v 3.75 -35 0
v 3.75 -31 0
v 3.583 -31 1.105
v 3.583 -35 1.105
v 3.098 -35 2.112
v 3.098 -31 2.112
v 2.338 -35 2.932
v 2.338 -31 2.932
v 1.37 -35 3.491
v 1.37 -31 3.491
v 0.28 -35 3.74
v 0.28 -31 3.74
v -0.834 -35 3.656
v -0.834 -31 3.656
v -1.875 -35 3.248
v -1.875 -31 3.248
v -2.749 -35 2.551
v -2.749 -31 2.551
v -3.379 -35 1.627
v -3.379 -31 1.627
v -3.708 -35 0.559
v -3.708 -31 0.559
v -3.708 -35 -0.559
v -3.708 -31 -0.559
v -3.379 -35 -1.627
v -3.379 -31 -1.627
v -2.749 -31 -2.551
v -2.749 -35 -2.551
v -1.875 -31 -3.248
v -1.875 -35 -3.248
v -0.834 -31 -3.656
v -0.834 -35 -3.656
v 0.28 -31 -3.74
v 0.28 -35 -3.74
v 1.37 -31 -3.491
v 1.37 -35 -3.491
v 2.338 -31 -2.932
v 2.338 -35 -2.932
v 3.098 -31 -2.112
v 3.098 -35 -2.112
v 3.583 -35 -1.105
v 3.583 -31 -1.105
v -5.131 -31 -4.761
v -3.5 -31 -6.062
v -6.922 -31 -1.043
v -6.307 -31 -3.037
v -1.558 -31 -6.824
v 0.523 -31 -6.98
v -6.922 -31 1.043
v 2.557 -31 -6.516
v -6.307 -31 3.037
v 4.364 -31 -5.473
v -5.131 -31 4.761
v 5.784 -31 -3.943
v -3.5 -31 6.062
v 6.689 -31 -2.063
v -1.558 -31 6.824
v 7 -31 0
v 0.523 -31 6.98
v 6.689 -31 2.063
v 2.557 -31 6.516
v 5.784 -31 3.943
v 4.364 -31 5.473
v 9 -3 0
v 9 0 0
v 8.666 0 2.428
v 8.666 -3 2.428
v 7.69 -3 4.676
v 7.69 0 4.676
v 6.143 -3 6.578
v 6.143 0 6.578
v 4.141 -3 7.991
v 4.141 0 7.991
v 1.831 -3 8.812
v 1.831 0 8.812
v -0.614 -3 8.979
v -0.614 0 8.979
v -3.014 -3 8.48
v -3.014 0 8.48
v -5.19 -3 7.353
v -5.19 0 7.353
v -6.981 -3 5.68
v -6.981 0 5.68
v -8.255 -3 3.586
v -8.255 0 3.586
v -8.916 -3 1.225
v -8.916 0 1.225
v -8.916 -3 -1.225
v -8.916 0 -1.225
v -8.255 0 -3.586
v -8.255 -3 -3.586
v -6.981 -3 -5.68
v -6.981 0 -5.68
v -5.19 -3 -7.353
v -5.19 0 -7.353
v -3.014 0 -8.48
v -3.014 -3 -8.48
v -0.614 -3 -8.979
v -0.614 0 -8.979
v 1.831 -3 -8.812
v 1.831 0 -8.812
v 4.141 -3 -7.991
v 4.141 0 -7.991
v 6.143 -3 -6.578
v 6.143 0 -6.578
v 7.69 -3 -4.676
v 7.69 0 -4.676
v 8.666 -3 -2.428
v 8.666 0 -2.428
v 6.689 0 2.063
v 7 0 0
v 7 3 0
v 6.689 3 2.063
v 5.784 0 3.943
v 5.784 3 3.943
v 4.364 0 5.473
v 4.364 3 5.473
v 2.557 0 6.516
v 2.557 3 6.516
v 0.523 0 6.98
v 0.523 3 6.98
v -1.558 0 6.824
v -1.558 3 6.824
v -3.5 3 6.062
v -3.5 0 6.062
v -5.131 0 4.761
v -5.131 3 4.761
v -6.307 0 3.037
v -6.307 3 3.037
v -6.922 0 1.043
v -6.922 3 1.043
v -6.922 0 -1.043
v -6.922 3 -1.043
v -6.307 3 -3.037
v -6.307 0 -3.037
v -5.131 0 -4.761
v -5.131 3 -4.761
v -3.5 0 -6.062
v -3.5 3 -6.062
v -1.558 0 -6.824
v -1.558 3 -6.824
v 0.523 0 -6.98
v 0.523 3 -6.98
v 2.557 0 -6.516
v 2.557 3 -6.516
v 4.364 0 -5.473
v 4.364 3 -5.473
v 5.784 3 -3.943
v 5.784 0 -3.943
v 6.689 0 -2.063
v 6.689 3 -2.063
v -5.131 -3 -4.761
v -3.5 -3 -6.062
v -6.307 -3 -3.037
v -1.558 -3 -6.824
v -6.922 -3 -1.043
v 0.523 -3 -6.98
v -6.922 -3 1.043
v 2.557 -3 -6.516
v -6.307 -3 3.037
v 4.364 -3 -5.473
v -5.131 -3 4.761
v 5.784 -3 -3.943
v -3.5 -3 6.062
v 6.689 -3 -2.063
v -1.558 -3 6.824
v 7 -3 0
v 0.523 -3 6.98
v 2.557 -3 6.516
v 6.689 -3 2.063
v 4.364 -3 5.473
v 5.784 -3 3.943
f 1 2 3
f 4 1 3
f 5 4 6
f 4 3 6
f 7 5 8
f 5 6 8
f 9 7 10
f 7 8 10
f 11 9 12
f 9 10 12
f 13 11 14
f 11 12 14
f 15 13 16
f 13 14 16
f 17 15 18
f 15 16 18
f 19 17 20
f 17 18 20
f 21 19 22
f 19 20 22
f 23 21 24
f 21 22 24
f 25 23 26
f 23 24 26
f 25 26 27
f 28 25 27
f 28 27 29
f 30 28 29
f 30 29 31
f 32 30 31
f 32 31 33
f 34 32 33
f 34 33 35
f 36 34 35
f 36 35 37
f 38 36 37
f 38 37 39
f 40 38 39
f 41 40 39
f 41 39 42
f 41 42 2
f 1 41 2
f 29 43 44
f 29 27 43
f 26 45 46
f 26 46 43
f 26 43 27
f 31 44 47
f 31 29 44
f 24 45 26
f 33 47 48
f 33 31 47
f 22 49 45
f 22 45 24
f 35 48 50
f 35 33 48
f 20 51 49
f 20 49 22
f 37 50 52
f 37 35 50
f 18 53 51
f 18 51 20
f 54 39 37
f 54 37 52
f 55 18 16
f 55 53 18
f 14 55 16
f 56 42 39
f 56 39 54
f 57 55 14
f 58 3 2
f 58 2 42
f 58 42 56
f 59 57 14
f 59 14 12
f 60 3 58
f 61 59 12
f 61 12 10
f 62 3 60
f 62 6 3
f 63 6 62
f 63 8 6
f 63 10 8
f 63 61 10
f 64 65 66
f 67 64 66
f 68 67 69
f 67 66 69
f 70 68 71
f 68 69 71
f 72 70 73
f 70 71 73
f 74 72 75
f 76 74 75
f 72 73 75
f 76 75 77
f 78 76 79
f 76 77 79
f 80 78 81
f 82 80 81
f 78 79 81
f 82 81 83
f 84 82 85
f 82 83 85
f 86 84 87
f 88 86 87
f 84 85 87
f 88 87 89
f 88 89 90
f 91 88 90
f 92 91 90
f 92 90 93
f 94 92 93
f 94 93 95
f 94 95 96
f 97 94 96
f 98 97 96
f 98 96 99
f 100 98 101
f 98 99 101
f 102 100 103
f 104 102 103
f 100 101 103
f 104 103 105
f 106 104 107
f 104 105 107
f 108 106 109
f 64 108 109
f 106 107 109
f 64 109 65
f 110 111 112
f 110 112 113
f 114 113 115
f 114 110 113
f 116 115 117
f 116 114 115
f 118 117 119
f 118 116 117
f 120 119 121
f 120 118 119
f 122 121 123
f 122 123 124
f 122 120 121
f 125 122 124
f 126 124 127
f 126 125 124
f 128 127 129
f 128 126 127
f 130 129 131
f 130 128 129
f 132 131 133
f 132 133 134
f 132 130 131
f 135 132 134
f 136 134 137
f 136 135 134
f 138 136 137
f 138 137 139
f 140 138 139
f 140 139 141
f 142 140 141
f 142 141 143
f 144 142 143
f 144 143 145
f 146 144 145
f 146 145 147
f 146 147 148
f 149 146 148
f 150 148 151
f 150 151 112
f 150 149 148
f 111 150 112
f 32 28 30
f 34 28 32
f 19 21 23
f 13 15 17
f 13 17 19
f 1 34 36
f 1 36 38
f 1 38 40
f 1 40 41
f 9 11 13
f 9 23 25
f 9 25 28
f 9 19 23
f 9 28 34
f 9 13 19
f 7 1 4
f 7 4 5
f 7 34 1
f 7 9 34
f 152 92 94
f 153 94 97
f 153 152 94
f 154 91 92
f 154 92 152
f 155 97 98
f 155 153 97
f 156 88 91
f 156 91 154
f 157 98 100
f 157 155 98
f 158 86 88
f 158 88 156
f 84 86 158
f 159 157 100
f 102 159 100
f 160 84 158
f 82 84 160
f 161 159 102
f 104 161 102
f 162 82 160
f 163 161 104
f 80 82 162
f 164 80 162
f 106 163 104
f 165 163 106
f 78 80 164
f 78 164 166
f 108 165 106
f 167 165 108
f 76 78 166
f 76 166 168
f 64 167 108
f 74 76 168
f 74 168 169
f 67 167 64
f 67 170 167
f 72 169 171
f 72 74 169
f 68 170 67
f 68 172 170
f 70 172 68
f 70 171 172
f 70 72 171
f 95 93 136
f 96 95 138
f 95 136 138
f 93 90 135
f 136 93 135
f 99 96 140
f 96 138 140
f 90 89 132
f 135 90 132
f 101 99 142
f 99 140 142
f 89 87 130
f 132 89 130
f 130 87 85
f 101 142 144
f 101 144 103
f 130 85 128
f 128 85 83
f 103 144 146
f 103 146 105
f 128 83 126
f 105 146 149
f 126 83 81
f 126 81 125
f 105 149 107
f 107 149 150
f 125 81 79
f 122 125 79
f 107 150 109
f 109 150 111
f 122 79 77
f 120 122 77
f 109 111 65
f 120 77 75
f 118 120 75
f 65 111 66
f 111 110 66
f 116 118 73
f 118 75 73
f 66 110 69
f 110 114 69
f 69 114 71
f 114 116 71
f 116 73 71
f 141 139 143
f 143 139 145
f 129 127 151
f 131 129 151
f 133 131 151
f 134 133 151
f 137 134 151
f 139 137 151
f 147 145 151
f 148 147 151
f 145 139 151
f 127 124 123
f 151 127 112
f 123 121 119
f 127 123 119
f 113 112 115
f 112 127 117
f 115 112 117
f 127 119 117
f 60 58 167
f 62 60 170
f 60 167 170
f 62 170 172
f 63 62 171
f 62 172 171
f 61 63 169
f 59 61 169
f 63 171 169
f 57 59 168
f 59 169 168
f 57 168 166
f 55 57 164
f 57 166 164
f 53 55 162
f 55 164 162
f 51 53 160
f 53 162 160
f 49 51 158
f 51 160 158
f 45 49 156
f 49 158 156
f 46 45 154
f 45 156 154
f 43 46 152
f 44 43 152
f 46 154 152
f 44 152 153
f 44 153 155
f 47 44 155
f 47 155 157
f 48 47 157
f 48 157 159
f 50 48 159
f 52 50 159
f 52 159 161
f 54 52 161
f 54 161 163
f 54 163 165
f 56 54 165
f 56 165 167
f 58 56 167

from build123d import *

# Parameters (mm, degrees)
F0_R     = 7
F0_R_2   = 3.75
F1_DEPTH = 31
F0_R_3   = 9
F2_DEPTH = 3
F3_DEPTH = 3
F4_DEPTH = 3
F5_DEPTH = 35


with BuildPart() as f1:
    # F0 (on Front) → F1 (new body)
    with BuildSketch(Plane.XZ):
        Circle(F0_R)
        Circle(F0_R_2, mode=Mode.SUBTRACT)
    extrude(amount=F1_DEPTH)

    # F0 (on Front) → F2 (join)
    with BuildSketch(Plane.XZ):
        Circle(F0_R_3)
        Circle(F0_R, mode=Mode.SUBTRACT)
    extrude(amount=F2_DEPTH)

    # F0 (on Front) → F3 (join)
    with BuildSketch(Plane.XZ):
        Circle(F0_R)
        Circle(F0_R_2, mode=Mode.SUBTRACT)
    extrude(amount=-F3_DEPTH)

    # F0 (on Front) → F4 (join)
    with BuildSketch(Plane.XZ):
        Circle(F0_R_2)
    extrude(amount=-F4_DEPTH)

    # F0 (on Front) → F5 (join)
    with BuildSketch(Plane.XZ):
        Circle(F0_R_2)
    extrude(amount=F5_DEPTH)


solid = f1.part
